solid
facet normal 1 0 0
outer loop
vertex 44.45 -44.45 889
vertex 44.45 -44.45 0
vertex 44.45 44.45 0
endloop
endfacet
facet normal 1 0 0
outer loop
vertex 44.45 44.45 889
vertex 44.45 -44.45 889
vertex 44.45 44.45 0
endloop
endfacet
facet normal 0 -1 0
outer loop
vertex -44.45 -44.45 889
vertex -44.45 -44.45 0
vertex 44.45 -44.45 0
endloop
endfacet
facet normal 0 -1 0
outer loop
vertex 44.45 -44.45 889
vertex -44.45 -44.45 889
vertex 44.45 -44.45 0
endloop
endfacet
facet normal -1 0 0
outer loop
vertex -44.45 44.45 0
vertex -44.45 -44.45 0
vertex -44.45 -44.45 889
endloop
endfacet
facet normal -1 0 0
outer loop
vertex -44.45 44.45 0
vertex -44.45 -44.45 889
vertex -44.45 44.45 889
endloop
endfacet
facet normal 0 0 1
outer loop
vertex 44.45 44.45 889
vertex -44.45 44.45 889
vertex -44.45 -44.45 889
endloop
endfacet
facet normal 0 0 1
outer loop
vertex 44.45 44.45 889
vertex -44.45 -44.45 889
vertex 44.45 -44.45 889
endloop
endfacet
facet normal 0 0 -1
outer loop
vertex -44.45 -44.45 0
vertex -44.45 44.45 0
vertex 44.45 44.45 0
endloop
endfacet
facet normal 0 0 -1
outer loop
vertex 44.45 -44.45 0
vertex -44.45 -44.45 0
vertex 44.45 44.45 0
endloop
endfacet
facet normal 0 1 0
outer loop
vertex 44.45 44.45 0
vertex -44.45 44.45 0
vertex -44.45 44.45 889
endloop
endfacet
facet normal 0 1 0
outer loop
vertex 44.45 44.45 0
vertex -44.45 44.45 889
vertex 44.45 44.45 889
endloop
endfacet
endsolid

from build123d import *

# Parameters (mm, degrees)
F0_W     = 88.9
F0_H     = 88.9
F1_DEPTH = 889


with BuildPart() as f1:
    # F0 (on Top) → F1 (new body)
    with BuildSketch(Plane.XY):
        Rectangle(F0_W, F0_H)
    extrude(amount=F1_DEPTH)


with BuildPart() as f2_1:
    # F2: copy of F1
    add(f1.part)


solid = f1.part
